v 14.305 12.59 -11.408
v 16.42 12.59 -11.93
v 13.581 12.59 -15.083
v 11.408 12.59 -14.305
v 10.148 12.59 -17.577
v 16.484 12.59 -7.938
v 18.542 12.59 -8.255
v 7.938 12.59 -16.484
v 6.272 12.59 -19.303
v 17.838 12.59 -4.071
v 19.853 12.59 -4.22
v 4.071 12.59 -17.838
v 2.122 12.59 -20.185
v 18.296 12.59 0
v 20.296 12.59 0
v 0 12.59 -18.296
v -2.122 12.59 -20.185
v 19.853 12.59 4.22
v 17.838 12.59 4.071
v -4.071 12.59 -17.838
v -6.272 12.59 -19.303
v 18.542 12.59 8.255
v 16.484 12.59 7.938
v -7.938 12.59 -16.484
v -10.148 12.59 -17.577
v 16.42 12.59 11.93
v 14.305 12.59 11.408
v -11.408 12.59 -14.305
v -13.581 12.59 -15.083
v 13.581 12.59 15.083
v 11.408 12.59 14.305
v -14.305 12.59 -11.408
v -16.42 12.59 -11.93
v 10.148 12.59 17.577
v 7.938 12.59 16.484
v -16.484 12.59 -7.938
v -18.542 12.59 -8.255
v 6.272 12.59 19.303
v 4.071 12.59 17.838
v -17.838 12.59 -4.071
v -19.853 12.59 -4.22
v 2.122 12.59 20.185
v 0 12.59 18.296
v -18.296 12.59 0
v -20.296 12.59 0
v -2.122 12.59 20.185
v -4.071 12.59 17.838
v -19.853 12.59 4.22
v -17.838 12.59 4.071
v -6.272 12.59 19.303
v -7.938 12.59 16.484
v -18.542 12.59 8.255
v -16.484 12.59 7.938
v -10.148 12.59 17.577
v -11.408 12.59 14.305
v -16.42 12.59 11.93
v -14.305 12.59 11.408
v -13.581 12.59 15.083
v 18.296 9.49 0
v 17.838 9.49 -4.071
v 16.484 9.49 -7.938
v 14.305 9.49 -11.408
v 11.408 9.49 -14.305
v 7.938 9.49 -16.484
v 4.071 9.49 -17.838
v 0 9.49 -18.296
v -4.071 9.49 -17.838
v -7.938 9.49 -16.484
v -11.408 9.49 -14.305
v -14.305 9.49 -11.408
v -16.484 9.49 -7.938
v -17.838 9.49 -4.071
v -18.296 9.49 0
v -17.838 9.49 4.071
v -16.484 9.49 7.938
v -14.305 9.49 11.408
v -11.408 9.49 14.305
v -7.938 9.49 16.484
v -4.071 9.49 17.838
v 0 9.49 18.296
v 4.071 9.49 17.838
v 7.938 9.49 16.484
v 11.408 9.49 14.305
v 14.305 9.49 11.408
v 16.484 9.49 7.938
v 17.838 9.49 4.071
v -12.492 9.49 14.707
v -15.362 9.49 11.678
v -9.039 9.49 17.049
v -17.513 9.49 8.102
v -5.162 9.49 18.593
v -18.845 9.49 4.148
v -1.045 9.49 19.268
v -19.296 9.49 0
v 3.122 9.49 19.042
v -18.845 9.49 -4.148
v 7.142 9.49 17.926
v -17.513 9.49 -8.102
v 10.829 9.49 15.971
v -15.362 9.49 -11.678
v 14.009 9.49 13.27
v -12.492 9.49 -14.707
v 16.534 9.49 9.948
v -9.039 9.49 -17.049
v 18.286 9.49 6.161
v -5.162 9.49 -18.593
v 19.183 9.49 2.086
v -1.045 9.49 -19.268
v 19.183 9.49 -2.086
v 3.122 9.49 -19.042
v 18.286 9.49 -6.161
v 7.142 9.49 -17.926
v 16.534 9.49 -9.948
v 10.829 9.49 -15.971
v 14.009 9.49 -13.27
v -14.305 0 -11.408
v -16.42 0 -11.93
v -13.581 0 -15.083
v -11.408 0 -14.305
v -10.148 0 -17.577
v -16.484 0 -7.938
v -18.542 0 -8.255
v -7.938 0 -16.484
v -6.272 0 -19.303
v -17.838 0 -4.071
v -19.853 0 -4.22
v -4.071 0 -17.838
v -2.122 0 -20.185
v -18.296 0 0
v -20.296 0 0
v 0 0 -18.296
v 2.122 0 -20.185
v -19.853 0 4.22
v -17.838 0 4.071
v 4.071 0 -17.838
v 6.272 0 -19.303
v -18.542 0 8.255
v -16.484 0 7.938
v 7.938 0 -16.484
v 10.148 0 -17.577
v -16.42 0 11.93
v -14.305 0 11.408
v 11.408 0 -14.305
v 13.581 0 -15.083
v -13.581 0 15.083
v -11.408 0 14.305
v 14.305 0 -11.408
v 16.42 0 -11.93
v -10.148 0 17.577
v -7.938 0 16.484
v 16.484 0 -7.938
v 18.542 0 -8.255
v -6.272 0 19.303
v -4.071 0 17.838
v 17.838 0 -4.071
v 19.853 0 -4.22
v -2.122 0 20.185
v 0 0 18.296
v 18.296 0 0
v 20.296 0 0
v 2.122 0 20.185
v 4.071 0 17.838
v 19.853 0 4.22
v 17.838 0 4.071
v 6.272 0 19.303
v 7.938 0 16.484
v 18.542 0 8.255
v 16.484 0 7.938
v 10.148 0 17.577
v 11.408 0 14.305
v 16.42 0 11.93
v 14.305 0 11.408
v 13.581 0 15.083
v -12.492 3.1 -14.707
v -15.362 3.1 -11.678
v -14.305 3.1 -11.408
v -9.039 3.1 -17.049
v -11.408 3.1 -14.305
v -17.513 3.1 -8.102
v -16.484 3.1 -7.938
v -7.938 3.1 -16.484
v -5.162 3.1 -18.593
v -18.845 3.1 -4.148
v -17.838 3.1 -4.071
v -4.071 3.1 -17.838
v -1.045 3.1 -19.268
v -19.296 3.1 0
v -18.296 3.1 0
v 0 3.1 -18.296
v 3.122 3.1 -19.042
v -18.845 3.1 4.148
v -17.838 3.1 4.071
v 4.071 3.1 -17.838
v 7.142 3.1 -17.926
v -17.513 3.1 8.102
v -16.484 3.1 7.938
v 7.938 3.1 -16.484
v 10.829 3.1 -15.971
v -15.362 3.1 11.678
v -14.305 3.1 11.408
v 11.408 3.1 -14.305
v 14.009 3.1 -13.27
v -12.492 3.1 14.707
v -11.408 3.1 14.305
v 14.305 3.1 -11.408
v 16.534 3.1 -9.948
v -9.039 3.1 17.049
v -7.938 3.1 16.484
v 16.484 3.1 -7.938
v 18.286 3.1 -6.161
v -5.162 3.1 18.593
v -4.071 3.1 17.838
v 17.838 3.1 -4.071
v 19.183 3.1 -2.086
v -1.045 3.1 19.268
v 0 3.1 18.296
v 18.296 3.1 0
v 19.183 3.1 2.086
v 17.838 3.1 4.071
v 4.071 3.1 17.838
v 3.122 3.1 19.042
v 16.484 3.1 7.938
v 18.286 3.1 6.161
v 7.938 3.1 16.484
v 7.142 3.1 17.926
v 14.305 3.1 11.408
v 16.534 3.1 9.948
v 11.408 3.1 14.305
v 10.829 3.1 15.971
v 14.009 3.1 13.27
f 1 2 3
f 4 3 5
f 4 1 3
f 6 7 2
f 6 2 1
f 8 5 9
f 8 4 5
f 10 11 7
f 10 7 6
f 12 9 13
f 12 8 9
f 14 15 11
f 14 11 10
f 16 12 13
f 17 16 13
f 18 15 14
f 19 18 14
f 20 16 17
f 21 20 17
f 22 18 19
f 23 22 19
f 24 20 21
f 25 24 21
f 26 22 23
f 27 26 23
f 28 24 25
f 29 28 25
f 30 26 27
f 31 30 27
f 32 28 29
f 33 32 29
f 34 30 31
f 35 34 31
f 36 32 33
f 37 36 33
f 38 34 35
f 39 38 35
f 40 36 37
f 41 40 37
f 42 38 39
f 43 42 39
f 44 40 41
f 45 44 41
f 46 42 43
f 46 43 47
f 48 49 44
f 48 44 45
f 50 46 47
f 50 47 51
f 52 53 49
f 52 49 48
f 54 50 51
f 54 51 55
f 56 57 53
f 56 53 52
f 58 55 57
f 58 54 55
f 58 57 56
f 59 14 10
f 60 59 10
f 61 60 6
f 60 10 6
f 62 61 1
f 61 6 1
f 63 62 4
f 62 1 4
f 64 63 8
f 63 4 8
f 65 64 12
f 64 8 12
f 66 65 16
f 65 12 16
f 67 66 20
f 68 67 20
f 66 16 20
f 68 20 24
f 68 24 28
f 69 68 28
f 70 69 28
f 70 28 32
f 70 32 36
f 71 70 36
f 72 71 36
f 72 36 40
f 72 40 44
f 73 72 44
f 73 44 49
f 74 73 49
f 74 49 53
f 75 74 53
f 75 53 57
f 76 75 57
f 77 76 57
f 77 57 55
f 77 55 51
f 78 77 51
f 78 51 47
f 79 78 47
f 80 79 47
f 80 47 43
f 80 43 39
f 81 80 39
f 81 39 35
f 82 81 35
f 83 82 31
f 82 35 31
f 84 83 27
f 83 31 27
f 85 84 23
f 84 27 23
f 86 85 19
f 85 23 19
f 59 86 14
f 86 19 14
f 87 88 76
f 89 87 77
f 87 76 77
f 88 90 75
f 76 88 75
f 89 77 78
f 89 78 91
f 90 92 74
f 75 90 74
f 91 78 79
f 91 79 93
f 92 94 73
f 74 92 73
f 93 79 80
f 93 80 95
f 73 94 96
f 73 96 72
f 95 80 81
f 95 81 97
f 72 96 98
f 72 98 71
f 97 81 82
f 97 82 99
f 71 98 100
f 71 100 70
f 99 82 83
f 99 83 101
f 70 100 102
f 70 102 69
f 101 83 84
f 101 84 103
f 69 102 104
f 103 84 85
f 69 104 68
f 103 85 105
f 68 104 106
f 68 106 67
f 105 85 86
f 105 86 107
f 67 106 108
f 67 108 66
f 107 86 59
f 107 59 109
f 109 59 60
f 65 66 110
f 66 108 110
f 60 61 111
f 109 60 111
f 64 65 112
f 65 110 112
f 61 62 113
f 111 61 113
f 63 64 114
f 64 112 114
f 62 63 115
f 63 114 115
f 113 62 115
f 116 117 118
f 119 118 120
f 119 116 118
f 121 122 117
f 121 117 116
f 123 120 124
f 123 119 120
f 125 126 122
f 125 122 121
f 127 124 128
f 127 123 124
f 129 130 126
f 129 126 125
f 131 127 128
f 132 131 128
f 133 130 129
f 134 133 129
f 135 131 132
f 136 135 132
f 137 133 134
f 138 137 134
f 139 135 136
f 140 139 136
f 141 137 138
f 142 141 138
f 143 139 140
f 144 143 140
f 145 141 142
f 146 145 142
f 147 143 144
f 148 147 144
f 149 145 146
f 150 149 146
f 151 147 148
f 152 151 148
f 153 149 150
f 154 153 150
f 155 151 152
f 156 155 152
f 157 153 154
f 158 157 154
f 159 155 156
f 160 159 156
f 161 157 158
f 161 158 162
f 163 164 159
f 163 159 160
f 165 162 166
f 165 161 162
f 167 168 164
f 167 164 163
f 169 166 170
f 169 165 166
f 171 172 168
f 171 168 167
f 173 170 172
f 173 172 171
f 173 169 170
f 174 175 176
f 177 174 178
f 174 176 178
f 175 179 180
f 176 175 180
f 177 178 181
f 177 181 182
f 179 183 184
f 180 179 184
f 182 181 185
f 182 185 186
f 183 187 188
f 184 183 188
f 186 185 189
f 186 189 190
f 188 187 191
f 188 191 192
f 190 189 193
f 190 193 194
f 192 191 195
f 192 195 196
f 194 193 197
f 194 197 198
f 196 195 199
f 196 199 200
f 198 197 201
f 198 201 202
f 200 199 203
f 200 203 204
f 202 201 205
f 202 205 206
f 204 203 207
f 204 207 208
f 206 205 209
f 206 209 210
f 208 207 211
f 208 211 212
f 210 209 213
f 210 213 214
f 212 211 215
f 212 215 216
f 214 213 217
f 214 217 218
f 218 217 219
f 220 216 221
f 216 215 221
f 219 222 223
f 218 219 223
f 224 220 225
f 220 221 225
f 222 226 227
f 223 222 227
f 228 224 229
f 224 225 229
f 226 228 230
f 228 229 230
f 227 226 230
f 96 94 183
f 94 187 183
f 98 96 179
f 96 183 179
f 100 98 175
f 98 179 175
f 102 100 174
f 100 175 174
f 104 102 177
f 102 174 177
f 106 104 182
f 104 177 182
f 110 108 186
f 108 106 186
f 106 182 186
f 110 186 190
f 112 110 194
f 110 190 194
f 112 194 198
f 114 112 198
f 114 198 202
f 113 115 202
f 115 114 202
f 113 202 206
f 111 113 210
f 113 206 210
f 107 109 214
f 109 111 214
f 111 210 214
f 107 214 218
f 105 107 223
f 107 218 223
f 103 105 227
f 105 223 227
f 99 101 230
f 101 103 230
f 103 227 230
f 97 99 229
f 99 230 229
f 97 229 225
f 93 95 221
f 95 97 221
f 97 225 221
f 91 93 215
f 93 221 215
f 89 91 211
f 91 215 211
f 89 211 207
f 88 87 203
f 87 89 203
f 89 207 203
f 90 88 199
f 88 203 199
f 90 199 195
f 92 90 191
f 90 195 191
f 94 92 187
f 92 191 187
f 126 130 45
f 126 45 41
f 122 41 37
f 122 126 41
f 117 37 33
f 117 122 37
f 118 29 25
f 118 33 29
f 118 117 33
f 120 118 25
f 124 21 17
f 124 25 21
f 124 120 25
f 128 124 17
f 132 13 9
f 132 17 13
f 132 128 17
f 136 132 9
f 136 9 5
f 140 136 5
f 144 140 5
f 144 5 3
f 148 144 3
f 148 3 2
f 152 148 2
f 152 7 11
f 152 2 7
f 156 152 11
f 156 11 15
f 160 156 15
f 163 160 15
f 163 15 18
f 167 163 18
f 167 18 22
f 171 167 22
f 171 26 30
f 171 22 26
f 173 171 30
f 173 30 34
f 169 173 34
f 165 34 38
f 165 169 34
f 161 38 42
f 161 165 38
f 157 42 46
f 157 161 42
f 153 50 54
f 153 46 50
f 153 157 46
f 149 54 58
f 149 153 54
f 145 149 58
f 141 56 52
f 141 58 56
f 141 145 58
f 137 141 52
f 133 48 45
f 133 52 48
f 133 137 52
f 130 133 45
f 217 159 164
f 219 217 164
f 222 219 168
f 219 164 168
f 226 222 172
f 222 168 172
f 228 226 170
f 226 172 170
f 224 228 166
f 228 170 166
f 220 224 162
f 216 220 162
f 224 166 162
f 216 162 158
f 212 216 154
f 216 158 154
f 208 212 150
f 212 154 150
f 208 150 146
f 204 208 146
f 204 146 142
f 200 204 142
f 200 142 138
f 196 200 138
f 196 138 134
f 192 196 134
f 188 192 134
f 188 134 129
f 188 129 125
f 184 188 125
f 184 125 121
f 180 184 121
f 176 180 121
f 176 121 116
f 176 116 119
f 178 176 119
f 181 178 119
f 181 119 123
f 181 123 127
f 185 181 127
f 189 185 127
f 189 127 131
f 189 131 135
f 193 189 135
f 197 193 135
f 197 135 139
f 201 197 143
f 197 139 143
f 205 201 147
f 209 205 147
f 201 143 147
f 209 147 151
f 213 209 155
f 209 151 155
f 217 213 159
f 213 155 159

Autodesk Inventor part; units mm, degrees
ref_plane "YZ Plane" through (0, 0, 0) normal (1, 0, 0) x (0, 1, 0)
ref_plane "XZ Plane" through (0, 0, 0) normal (0, 1, 0) x (-1, 0, 0)
ref_plane "XY Plane" through (0, 0, 0) normal (0, 0, 1) x (1, 0, 0)
sketch "Sketch1" plane through (0, 0, 0) normal (0, 1, 0) x (-1, 0, 0)
  circle A0 centre (0, 0) radius 19.2963
  circle A1 centre (0, 0) radius 20.2963
  dimension "d0" = 38.5926
  dimension "d7" = 40.5926
extrude "Extrusion2" add sketch "Sketch1" along normal blind 12.59
sketch "Sketch2" plane through (0, 12.59, 0) normal (0, 1, 0) x (1, 0, 0)
  circle A0 centre (0, 0) radius 19.2963
  circle A1 centre (0, 0) radius 18.2963
  dimension "d12" = 38.5926
  dimension "d13" = 36.5926
extrude "Extrusion3" add sketch "Sketch2" against normal blind 3.1
sketch "Sketch3" plane through (0, 0, 0) normal (0, -1, 0) x (1, 0, 0)
  circle A0 centre (0, 0) radius 19.2963
  circle A1 centre (0, 0) radius 18.2963
  dimension "d16" = 38.5926
  dimension "d17" = 36.5926
extrude "Extrusion4" add sketch "Sketch3" against normal blind 3.1
equation "\"d7\" = -2 * WoodThickness + 2 * d176 - 2 * d125"
equation "\"d12\" = d0"
equation "\"d16\" = d0"
equation "\"WoodThickness\" = 6.39"
equation "\"BearingHolderHeight\" = 13.1"
equation "\"d176\" = 34.539"
equation "\"d125\" = 7.852683"
properties part number "CouplingHead_Silicone" material "UHMW, White"
